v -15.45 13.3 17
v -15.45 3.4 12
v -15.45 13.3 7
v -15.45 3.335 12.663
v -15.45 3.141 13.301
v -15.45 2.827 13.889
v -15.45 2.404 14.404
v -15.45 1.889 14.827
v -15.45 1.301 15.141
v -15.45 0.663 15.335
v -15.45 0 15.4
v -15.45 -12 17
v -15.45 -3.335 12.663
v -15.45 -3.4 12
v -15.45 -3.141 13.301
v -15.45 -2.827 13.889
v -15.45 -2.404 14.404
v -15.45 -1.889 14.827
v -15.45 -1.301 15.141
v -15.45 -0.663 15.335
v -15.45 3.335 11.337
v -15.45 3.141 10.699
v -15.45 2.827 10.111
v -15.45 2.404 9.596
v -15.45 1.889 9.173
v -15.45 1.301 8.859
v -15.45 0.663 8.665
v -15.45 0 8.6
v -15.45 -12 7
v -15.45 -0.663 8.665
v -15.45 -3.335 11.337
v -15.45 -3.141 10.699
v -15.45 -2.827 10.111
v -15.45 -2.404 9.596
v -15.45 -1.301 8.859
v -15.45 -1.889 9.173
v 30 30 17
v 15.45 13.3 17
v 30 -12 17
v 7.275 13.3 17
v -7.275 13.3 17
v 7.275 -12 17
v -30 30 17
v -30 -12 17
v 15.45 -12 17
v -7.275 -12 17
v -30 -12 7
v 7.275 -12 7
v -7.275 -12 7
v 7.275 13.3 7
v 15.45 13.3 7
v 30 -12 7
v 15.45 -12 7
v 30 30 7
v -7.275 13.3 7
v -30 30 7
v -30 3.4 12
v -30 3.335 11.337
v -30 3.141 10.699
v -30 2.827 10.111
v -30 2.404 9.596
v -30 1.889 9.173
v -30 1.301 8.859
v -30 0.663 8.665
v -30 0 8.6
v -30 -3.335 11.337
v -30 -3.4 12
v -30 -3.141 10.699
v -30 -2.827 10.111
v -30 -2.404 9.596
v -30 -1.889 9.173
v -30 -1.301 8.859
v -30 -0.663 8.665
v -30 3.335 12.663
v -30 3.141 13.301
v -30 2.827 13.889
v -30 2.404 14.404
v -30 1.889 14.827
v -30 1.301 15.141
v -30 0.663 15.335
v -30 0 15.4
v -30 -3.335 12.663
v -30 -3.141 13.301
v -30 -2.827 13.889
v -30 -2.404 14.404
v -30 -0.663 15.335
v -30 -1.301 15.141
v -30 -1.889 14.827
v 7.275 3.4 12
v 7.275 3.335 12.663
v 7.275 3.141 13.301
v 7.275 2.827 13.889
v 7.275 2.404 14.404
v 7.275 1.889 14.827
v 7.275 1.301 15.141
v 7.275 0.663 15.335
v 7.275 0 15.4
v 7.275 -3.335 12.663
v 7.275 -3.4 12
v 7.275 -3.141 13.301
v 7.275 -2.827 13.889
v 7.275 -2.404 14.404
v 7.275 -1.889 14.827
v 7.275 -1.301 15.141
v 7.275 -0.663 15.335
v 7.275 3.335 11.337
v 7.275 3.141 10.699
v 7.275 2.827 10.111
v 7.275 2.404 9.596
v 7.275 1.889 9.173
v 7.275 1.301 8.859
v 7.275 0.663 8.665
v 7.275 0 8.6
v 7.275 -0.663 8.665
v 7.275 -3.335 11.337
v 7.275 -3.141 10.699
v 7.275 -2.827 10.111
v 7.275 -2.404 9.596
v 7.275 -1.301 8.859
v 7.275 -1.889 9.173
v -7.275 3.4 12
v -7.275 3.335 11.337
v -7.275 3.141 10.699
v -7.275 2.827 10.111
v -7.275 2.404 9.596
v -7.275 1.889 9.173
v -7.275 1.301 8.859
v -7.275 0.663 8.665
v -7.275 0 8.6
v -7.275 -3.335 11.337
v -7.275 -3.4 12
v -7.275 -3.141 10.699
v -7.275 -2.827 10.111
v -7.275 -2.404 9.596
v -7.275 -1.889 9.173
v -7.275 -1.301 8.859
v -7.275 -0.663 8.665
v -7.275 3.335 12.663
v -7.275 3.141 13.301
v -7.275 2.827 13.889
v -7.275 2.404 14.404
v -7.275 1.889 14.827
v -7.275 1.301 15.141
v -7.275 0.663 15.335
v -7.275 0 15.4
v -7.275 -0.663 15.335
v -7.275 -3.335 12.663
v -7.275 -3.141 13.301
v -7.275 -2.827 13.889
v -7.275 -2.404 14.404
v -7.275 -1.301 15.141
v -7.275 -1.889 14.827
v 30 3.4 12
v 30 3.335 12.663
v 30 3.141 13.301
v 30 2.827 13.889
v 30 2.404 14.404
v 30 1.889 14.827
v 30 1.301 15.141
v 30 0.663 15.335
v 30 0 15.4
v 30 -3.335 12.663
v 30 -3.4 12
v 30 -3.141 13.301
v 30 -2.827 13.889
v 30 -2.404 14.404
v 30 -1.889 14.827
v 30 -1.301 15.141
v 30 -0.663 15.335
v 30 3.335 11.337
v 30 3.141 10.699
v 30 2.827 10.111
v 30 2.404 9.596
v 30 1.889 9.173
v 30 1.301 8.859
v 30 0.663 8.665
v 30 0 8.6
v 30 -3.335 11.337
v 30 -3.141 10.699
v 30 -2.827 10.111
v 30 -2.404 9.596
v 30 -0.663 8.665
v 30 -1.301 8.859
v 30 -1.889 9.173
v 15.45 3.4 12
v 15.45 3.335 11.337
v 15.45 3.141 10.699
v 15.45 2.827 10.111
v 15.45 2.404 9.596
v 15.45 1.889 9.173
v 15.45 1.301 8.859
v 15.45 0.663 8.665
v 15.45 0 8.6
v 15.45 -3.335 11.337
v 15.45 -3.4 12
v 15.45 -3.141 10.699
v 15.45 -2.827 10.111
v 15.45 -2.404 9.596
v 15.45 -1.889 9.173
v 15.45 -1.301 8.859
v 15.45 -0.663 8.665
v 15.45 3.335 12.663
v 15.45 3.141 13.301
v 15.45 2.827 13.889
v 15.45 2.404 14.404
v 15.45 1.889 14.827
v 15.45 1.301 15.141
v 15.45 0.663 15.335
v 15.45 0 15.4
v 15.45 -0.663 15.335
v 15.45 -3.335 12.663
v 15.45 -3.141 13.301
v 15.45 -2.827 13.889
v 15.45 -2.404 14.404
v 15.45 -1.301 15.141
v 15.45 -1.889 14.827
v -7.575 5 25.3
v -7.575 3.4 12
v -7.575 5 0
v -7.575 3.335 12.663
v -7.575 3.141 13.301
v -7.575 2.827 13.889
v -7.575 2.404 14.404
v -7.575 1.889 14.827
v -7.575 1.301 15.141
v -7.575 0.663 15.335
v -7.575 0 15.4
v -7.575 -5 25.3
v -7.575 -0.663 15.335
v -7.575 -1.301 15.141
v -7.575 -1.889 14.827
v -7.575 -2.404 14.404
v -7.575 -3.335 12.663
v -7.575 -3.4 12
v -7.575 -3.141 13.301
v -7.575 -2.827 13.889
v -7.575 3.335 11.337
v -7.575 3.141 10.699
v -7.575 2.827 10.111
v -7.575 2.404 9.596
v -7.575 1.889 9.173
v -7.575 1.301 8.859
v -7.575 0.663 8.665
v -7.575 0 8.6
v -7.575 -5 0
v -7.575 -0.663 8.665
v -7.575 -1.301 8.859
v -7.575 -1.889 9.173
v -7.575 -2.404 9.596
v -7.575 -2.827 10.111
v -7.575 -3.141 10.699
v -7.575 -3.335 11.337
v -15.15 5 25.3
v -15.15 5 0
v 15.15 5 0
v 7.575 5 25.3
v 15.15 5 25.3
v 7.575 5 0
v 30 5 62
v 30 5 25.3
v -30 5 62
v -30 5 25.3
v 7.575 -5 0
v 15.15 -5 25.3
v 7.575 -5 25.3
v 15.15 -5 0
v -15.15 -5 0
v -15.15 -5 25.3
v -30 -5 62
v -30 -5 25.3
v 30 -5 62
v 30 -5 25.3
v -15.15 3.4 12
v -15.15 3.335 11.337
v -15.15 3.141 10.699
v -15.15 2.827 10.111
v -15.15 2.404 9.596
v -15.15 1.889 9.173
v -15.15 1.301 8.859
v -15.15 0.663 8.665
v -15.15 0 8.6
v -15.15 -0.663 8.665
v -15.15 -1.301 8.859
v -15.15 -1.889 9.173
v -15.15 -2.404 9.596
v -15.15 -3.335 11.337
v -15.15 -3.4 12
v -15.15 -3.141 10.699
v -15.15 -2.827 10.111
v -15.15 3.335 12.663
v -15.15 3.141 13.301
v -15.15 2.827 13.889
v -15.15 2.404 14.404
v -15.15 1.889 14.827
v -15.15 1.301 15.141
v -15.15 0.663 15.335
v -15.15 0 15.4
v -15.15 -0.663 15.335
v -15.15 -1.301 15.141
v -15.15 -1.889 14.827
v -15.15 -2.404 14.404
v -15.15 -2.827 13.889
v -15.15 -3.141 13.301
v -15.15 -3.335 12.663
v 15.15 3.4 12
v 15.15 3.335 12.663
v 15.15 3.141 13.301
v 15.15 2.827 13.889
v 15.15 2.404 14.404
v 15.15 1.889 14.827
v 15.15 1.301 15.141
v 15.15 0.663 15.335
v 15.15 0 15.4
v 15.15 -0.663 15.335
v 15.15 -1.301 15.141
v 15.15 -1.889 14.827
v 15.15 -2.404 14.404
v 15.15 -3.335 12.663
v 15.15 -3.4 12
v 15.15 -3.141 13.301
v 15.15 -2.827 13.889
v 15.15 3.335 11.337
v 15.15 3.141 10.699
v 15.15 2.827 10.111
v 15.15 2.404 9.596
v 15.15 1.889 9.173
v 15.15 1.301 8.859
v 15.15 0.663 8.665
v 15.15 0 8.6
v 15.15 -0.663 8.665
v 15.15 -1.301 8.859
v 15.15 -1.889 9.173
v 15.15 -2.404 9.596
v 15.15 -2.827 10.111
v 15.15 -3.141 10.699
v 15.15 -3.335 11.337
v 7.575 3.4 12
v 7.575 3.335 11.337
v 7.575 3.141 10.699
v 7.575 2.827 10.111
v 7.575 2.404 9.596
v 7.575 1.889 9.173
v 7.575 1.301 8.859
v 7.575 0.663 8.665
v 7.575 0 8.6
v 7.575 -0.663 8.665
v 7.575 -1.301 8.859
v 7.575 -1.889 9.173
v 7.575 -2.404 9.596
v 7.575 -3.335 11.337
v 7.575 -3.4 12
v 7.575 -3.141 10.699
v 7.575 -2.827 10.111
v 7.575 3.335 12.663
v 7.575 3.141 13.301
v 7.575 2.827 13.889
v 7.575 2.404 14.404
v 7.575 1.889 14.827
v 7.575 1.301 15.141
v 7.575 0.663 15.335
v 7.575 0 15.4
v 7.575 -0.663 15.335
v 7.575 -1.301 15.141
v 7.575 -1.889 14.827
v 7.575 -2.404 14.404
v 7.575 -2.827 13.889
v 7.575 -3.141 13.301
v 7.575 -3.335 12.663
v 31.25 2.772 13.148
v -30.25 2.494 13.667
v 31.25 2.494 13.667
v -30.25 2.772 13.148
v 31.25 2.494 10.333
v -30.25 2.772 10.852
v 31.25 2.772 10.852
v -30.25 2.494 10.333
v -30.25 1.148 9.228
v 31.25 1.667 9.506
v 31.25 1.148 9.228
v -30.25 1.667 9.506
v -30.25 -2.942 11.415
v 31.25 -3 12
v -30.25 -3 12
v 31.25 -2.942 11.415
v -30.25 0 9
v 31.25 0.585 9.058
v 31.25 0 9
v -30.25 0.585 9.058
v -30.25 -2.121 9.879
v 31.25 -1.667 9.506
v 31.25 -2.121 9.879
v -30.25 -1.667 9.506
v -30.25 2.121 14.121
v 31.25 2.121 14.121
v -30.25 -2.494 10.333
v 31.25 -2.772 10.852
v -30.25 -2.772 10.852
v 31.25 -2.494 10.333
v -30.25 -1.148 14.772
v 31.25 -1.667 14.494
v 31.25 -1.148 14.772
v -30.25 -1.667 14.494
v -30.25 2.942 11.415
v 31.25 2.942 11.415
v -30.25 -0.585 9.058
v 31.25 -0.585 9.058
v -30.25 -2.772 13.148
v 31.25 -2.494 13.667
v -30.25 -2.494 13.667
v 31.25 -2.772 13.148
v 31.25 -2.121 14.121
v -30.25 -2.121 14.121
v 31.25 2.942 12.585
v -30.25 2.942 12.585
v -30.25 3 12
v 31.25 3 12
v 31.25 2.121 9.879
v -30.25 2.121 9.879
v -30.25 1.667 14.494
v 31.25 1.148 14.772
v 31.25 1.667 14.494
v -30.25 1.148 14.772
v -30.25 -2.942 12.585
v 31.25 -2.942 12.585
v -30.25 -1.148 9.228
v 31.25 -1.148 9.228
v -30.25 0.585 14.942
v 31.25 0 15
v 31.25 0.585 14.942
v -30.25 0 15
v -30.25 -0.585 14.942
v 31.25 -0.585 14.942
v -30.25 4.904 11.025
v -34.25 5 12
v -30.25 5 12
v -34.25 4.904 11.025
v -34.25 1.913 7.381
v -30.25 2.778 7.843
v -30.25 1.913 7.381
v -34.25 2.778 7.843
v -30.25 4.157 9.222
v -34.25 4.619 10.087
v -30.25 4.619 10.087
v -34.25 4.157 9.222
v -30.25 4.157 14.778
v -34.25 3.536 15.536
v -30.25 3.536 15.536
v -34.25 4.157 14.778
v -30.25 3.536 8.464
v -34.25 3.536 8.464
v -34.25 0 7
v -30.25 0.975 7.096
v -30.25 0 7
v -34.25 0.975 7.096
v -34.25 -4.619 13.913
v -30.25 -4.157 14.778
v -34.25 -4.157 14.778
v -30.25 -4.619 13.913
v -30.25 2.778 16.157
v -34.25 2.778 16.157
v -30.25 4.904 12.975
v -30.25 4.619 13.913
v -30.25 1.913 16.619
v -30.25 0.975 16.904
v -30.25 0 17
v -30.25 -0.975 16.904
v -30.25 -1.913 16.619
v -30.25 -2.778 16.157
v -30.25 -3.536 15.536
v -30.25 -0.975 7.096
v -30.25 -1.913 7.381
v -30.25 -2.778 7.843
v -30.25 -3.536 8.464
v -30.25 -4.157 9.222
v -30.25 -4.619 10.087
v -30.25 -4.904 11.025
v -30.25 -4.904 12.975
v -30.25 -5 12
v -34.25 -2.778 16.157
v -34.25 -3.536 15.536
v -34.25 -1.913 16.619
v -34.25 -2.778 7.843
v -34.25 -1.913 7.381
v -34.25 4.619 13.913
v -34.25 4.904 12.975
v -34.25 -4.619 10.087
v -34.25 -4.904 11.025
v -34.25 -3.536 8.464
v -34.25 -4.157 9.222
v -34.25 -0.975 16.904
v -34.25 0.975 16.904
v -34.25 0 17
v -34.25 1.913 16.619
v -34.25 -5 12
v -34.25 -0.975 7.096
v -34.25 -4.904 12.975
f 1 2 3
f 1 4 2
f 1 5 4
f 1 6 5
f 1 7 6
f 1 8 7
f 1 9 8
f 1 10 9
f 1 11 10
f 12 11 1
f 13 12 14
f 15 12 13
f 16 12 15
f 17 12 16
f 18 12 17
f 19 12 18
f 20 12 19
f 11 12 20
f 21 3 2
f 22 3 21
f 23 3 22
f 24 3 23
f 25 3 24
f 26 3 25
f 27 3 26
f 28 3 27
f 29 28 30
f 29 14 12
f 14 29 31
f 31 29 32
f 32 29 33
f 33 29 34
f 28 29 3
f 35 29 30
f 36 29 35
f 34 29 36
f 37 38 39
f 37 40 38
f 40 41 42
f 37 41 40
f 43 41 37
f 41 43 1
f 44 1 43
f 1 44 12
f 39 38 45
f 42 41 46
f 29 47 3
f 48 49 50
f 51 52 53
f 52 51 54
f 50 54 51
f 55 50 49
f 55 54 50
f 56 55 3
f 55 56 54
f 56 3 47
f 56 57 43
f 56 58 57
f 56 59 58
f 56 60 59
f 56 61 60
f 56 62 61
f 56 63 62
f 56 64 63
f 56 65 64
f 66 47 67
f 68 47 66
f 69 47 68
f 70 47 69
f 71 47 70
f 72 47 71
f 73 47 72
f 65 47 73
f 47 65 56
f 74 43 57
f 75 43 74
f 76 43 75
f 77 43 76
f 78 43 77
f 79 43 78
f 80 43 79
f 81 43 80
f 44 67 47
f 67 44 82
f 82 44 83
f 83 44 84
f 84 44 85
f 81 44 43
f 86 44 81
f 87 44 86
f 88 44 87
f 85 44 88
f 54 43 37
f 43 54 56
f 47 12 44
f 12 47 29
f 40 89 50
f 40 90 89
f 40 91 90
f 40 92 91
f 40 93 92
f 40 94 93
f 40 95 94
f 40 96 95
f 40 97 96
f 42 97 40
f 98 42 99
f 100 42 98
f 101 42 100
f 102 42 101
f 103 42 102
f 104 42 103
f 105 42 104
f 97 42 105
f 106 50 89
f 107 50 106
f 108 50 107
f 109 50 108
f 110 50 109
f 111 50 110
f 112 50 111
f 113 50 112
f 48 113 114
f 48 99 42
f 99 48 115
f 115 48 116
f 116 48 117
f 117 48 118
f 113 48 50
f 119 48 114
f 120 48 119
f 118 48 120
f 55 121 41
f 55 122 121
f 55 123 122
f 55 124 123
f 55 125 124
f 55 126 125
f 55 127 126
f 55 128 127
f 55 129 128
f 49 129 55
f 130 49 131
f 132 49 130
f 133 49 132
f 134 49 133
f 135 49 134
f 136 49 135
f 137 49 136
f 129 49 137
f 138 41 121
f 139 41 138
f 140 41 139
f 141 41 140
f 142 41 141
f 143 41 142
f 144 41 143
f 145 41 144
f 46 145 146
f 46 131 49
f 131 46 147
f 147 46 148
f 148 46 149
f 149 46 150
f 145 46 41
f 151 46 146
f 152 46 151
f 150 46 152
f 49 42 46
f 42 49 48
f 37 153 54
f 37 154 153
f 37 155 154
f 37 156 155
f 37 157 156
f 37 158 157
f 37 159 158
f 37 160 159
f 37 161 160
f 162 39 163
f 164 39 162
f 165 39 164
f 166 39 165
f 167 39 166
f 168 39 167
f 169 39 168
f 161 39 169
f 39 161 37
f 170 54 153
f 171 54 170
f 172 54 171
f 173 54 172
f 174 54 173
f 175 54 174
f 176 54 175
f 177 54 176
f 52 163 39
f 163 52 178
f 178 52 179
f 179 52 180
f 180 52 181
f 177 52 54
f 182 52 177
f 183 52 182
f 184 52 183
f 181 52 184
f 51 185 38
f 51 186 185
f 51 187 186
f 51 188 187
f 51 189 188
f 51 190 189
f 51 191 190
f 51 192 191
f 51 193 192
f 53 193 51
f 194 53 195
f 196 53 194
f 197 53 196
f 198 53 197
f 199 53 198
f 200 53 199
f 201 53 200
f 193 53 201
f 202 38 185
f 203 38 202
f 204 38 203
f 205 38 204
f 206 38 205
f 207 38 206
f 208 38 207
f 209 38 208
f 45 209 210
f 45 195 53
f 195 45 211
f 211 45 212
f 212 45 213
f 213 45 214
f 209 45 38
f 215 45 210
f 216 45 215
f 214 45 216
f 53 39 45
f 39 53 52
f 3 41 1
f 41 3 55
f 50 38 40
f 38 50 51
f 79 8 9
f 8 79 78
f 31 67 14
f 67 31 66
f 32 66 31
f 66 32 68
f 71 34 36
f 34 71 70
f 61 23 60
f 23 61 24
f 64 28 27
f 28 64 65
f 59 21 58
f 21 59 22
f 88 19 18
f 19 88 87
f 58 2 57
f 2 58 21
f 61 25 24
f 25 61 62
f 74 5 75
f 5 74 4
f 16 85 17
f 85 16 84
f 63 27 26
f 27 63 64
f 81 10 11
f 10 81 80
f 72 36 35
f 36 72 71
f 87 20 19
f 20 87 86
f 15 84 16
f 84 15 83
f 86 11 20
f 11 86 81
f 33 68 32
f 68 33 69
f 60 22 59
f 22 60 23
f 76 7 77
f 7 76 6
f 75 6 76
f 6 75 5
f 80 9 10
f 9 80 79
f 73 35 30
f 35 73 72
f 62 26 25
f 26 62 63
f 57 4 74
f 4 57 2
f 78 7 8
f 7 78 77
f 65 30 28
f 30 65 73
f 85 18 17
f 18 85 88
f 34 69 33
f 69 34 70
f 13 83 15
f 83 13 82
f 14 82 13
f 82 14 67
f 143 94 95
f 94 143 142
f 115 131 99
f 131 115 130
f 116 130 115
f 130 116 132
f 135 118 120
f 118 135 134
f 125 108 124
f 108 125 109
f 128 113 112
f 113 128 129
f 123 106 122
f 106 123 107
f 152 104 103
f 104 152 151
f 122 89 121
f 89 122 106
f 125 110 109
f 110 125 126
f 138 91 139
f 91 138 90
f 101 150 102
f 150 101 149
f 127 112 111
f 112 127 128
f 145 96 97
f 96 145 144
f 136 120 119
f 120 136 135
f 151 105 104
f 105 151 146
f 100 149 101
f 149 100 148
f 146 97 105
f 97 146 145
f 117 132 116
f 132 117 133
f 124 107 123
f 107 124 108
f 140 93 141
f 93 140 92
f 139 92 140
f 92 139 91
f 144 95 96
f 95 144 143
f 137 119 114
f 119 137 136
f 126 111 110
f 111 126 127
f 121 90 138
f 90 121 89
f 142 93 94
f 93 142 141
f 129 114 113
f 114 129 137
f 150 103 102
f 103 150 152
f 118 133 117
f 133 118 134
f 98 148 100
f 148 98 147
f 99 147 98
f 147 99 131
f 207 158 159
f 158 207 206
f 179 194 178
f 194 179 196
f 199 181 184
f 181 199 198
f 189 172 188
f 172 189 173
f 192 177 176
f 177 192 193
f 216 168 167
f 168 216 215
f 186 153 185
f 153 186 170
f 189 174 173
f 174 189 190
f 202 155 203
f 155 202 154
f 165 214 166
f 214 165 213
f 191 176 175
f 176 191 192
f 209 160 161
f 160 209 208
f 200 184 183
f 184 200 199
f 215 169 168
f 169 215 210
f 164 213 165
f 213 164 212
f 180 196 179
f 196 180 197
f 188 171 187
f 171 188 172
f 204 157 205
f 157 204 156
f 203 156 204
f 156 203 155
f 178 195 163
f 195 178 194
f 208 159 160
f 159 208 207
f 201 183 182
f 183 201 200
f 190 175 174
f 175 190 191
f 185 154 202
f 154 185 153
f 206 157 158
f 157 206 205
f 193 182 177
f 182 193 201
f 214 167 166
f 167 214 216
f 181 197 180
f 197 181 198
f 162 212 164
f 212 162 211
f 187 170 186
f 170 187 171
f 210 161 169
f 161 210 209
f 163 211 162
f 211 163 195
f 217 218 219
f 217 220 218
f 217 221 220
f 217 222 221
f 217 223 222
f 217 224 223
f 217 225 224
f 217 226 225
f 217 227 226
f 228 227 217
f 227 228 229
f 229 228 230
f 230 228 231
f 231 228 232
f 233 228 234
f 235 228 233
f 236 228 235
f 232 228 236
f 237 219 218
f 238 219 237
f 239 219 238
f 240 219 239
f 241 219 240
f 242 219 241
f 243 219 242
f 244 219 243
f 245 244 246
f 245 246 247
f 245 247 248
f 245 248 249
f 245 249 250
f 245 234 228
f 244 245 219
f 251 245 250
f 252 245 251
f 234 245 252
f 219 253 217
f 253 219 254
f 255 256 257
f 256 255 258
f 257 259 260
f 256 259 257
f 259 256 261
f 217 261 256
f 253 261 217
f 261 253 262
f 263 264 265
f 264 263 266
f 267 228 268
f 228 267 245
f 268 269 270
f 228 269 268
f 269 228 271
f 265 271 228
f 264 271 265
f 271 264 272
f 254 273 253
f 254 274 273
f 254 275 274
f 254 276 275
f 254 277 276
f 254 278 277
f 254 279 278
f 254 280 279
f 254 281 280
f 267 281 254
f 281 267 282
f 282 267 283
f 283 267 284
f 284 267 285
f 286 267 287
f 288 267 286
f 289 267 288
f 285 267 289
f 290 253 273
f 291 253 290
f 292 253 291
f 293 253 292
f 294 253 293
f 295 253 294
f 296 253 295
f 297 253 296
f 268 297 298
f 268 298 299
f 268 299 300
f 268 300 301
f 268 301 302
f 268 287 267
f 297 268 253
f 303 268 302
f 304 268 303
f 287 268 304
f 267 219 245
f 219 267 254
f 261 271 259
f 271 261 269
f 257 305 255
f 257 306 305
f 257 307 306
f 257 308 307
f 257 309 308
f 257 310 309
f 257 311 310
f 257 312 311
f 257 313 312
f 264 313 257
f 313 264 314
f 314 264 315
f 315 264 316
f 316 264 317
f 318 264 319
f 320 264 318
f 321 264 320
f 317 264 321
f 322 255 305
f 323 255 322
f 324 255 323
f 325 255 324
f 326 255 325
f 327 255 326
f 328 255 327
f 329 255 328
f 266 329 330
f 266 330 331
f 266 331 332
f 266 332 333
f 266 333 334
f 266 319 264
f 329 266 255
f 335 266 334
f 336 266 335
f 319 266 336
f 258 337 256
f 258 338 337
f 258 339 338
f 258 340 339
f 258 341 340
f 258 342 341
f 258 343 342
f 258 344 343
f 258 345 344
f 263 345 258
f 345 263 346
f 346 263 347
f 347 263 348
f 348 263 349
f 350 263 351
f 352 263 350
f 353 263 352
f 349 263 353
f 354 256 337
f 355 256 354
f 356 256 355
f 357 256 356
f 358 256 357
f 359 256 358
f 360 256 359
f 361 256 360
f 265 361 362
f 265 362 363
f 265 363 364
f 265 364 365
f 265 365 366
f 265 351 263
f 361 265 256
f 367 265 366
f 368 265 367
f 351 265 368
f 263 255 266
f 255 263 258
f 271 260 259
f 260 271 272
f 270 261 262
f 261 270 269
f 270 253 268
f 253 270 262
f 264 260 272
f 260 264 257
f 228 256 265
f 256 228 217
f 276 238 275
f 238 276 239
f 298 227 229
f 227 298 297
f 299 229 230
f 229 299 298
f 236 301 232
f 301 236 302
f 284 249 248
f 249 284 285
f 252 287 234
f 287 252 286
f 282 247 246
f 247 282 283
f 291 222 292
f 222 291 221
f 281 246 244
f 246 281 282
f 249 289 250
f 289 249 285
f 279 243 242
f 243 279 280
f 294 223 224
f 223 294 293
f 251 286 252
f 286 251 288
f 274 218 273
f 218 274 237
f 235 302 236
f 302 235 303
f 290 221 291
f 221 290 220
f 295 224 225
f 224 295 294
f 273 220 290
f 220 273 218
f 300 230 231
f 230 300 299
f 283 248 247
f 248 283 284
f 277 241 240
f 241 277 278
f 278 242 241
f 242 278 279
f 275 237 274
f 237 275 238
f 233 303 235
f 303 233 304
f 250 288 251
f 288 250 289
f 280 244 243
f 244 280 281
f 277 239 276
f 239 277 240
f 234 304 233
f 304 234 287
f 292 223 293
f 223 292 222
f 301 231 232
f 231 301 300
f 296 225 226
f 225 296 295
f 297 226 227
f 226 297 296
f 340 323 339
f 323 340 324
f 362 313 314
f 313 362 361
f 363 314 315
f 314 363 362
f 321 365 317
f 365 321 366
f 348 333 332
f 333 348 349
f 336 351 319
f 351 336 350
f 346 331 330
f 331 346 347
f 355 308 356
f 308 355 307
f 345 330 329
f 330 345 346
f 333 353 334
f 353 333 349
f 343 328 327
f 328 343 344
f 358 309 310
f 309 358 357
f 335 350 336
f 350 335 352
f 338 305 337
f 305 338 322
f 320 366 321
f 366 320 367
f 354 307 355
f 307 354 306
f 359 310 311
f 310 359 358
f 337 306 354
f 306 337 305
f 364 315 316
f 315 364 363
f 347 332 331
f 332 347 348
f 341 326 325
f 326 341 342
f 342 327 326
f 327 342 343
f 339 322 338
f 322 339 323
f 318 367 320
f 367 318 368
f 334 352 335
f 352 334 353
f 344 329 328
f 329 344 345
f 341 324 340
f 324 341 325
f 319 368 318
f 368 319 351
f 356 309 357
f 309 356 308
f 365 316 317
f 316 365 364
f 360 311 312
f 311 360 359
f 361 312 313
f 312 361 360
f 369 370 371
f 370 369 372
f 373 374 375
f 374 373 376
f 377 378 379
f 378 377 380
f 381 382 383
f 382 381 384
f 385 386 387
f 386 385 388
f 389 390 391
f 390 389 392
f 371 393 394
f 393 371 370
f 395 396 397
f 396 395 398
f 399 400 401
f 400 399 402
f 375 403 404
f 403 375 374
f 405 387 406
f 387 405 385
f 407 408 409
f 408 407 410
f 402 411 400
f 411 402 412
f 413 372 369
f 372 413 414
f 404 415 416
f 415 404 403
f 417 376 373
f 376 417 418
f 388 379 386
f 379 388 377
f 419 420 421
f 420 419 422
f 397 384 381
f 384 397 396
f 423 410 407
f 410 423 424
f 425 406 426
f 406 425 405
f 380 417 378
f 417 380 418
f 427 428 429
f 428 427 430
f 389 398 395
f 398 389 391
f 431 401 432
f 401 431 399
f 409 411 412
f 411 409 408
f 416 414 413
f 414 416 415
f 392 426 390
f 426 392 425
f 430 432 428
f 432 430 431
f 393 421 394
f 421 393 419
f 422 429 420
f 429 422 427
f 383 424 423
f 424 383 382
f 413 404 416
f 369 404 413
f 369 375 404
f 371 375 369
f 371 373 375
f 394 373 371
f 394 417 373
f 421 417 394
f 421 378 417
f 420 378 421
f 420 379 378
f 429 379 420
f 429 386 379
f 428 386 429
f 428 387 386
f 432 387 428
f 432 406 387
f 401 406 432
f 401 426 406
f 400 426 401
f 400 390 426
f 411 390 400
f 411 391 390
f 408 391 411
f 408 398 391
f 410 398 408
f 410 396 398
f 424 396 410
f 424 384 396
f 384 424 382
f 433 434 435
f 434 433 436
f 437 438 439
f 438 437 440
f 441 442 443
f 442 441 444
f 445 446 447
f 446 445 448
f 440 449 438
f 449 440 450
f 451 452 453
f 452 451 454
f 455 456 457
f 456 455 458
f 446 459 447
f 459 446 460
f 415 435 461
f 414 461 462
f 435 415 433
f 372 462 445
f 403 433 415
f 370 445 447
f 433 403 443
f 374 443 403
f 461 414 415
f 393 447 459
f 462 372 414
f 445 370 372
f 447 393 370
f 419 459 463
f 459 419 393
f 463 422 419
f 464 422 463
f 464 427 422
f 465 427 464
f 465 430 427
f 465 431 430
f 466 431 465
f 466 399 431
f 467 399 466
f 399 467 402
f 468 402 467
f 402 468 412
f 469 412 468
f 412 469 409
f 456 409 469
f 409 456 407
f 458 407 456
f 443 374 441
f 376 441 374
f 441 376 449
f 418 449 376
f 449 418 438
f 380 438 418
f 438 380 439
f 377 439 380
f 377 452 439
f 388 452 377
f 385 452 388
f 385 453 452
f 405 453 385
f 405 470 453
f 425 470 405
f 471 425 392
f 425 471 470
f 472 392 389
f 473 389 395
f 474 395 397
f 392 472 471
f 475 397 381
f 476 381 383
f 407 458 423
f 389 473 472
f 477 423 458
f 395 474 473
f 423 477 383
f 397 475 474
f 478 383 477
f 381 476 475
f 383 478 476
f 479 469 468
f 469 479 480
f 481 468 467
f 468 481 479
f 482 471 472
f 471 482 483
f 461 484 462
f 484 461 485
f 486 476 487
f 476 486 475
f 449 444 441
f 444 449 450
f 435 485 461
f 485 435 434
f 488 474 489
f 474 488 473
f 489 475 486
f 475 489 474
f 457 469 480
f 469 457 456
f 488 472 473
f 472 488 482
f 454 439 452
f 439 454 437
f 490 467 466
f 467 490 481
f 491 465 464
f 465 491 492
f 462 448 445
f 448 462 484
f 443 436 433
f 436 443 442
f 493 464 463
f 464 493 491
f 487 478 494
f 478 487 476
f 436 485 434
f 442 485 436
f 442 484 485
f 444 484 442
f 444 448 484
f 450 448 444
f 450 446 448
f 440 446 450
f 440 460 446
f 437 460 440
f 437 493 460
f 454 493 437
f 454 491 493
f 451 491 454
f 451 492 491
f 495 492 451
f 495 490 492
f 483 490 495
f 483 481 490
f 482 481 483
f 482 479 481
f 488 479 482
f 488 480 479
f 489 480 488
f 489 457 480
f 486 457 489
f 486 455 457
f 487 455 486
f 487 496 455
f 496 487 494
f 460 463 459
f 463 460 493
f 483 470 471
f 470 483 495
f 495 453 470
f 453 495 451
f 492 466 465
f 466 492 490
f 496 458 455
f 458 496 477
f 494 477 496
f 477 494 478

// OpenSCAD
$fn = 32;

// ------------------------------------------------------------------------
// Butt hinge: hinge 60 mm, leaf swung 270 deg
// Every part is its own module, assembly() places every instance.
// ------------------------------------------------------------------------

// --- part 1 ---
module hinge_base() {
  difference() {
    union() {
      translate([-30, -12, -5]) cube([14.55, 42, 10]);
      translate([-7.275, -12, -5]) cube([14.55, 42, 10]);
      translate([15.45, -12, -5]) cube([14.55, 42, 10]);
      translate([-30, 13.3, -5]) cube([60, 16.7, 10]);
    }
    translate([-22.725, 0, 0]) rotate([0, 90, 0]) cylinder(h = 16.55, d = 6.8, center = true);
    translate([0, 0, 0]) rotate([0, 90, 0]) cylinder(h = 16.55, d = 6.8, center = true);
    translate([22.725, 0, 0]) rotate([0, 90, 0]) cylinder(h = 16.55, d = 6.8, center = true);
  }
}

// --- part 2 ---
module hinge_mover() {
  difference() {
    union() {
      translate([-15.15, -50, -5]) cube([7.575, 62, 10]);
      translate([7.575, -50, -5]) cube([7.575, 62, 10]);
      translate([-30, -50, -5]) cube([60, 36.7, 10]);
    }
    translate([-11.362, 0, 0]) rotate([0, 90, 0]) cylinder(h = 9.575, d = 6.8, center = true);
    translate([11.362, 0, 0]) rotate([0, 90, 0]) cylinder(h = 9.575, d = 6.8, center = true);
  }
}

// --- part 3 ---
module hinge_pin() {
  rotate([0, 90, 0]) cylinder(h = 62.5, d = 6, center = true);
  translate([-34.25, 0, 0]) rotate([0, 90, 0]) cylinder(h = 4, d = 10);
}

// --- assembly ---
module assembly() {
  color([0.80, 0.24, 0.20]) translate([0, 0, 12]) rotate([0, 0, 0]) hinge_base();
  color([0.20, 0.45, 0.75]) translate([0, 0, 12]) rotate([270, 0, 0]) hinge_mover();
  color([0.25, 0.62, 0.32]) translate([0, 0, 12]) rotate([0, 0, 0]) hinge_pin();
}

assembly();
